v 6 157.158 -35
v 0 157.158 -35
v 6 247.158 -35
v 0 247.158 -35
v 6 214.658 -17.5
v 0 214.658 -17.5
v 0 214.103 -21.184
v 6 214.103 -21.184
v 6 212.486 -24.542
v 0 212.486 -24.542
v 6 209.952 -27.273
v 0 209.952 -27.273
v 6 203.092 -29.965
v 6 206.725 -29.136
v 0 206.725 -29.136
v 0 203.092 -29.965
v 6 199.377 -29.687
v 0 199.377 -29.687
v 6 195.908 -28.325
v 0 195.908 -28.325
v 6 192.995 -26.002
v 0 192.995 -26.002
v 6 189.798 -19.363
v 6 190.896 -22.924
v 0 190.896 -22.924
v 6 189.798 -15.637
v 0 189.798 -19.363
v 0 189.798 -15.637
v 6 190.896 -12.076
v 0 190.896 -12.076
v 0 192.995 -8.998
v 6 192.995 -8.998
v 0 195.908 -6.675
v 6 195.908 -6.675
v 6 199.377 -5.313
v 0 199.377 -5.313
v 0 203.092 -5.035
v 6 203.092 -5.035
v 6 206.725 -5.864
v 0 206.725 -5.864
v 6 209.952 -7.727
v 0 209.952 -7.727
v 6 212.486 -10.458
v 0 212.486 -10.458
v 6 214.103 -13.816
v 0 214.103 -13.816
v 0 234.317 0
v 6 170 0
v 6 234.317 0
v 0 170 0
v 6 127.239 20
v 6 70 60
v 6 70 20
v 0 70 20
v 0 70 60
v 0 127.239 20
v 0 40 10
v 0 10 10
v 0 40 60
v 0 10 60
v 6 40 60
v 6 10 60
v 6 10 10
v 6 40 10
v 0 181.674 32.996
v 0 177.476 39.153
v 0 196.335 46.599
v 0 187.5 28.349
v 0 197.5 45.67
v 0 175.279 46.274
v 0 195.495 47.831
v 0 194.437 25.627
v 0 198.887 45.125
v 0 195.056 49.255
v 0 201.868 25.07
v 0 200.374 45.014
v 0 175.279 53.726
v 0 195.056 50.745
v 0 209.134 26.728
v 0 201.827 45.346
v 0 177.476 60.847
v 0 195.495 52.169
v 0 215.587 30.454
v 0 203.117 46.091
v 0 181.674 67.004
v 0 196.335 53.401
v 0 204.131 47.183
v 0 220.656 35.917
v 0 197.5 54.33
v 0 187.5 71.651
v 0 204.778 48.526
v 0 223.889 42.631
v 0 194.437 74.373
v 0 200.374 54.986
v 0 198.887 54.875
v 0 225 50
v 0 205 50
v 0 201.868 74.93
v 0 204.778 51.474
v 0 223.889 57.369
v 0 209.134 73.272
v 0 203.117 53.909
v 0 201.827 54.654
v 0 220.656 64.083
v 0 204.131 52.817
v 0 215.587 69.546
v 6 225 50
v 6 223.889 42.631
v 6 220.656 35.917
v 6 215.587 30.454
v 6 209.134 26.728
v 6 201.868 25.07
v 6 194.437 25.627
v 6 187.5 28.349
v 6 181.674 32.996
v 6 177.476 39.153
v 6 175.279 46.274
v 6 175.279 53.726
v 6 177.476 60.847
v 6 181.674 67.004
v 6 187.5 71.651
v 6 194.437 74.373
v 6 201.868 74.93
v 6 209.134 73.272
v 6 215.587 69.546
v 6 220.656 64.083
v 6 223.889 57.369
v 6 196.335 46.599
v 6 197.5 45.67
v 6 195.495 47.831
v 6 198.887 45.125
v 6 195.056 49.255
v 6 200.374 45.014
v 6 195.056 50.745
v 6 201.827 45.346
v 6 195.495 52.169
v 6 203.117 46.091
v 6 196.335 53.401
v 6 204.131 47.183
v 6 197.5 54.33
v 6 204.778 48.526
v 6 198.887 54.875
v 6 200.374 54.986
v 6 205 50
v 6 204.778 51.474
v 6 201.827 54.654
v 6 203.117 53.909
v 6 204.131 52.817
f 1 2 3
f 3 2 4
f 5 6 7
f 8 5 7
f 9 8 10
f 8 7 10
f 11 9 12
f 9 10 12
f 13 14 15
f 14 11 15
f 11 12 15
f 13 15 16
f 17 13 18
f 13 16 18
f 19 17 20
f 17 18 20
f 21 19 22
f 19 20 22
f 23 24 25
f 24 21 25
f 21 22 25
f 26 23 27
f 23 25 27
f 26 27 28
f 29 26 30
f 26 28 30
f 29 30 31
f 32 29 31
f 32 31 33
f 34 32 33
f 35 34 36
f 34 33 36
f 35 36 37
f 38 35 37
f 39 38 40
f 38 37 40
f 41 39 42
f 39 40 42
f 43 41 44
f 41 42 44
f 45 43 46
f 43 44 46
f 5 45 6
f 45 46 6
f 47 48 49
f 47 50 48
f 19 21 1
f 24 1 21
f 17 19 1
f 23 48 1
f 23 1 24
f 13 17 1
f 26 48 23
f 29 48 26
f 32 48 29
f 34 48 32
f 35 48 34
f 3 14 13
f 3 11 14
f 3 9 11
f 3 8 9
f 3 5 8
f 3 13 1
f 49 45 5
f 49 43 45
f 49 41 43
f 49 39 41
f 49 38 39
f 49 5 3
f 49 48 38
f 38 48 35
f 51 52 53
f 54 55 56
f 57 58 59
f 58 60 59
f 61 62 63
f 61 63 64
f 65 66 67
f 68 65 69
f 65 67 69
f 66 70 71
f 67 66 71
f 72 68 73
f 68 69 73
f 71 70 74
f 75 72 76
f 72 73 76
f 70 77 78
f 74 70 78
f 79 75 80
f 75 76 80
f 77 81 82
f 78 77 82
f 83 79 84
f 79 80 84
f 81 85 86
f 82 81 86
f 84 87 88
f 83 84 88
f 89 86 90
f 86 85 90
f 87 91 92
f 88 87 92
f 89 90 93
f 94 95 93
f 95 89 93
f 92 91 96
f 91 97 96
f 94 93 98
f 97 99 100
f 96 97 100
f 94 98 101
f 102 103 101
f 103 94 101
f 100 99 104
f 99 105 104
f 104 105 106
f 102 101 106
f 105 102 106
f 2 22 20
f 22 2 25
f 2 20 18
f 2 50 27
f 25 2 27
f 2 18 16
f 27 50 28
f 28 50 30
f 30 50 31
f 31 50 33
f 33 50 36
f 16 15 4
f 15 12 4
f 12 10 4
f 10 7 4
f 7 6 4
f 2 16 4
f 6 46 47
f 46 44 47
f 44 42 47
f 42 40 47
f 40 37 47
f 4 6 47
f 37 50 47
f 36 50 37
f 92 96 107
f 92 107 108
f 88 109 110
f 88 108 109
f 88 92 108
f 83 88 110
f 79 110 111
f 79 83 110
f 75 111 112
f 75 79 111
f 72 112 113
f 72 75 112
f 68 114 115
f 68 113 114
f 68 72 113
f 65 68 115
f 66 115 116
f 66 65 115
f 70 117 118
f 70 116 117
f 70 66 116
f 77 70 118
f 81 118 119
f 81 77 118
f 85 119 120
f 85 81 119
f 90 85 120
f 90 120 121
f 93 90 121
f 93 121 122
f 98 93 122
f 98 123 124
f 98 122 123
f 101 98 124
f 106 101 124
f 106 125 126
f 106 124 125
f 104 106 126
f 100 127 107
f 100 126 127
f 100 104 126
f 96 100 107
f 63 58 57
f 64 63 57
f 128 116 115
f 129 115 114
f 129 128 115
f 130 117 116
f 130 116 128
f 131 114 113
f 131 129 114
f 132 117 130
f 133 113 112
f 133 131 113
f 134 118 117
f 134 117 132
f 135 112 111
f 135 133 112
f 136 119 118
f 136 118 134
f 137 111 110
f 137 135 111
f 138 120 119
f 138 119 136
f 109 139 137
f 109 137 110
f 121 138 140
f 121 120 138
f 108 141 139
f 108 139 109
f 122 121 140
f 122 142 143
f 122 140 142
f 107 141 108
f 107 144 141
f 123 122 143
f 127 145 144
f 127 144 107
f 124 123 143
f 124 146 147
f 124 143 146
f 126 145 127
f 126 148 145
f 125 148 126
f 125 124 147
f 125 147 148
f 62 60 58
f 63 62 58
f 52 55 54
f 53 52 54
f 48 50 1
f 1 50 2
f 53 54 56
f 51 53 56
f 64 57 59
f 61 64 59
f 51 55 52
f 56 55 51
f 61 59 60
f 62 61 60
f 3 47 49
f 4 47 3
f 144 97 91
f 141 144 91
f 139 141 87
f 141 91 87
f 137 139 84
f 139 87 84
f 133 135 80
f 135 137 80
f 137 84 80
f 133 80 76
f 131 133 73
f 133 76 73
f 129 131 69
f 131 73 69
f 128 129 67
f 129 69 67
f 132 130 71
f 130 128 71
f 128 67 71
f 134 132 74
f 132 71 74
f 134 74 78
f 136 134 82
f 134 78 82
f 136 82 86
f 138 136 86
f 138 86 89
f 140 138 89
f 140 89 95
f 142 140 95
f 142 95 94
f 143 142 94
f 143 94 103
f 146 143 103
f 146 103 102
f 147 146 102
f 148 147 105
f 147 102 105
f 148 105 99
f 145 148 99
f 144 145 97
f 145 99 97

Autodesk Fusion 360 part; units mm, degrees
sketch "Sketch1" plane through (0, 0, 0) normal (1, 0, 0) x (0, 1, 0)
  line L0 (10, 10) -> (40, 10)
  line L1 (40, 10) -> (40, 60)
  line L2 (40, 60) -> (10, 60)
  line L3 (10, 60) -> (10, 10)
  line L4 (70, 60) -> (70, 20)
  line L5 (70, 20) -> (87.2389, 20)
  line L6 (87.2389, 20) -> (127.2389, 20)
  line L7 (70, 60) -> (127.2389, 20)
  circle A0 centre (200, 50) radius 25
  circle A1 centre (200, 50) radius 5
  line L8 (170, 0) -> (234.3166, 0)
  line L9 (202.1583, 0) -> (202.1583, -35) construction
  line L10 (202.1583, -35) -> (247.1583, -35)
  line L11 (202.1583, -35) -> (157.1583, -35)
  line L12 (170, 0) -> (157.1583, -35)
  line L13 (234.3166, 0) -> (247.1583, -35)
  circle A2 centre (202.1583, -17.5) radius 12.5
  dimension "d1" = 30
  dimension "d2" = 50
  dimension "d3" = 40
  dimension "d4" = 40
  dimension "d5" = 50
  dimension "d6" = 10
  dimension "d7" = 35
  dimension "d8" = 45
  dimension "d9" = 45
  dimension "d10" = 25
extrude "Extrude1" add sketch "Sketch1" along normal blind 6 makes body 1 at (0, 89.0796, 33.3333) makes body 2 at (0, 218.2216, 48.5096) makes body 3 at (0, 20, 43.3333) makes body 4 at (0, 172.2722, -17.5)
